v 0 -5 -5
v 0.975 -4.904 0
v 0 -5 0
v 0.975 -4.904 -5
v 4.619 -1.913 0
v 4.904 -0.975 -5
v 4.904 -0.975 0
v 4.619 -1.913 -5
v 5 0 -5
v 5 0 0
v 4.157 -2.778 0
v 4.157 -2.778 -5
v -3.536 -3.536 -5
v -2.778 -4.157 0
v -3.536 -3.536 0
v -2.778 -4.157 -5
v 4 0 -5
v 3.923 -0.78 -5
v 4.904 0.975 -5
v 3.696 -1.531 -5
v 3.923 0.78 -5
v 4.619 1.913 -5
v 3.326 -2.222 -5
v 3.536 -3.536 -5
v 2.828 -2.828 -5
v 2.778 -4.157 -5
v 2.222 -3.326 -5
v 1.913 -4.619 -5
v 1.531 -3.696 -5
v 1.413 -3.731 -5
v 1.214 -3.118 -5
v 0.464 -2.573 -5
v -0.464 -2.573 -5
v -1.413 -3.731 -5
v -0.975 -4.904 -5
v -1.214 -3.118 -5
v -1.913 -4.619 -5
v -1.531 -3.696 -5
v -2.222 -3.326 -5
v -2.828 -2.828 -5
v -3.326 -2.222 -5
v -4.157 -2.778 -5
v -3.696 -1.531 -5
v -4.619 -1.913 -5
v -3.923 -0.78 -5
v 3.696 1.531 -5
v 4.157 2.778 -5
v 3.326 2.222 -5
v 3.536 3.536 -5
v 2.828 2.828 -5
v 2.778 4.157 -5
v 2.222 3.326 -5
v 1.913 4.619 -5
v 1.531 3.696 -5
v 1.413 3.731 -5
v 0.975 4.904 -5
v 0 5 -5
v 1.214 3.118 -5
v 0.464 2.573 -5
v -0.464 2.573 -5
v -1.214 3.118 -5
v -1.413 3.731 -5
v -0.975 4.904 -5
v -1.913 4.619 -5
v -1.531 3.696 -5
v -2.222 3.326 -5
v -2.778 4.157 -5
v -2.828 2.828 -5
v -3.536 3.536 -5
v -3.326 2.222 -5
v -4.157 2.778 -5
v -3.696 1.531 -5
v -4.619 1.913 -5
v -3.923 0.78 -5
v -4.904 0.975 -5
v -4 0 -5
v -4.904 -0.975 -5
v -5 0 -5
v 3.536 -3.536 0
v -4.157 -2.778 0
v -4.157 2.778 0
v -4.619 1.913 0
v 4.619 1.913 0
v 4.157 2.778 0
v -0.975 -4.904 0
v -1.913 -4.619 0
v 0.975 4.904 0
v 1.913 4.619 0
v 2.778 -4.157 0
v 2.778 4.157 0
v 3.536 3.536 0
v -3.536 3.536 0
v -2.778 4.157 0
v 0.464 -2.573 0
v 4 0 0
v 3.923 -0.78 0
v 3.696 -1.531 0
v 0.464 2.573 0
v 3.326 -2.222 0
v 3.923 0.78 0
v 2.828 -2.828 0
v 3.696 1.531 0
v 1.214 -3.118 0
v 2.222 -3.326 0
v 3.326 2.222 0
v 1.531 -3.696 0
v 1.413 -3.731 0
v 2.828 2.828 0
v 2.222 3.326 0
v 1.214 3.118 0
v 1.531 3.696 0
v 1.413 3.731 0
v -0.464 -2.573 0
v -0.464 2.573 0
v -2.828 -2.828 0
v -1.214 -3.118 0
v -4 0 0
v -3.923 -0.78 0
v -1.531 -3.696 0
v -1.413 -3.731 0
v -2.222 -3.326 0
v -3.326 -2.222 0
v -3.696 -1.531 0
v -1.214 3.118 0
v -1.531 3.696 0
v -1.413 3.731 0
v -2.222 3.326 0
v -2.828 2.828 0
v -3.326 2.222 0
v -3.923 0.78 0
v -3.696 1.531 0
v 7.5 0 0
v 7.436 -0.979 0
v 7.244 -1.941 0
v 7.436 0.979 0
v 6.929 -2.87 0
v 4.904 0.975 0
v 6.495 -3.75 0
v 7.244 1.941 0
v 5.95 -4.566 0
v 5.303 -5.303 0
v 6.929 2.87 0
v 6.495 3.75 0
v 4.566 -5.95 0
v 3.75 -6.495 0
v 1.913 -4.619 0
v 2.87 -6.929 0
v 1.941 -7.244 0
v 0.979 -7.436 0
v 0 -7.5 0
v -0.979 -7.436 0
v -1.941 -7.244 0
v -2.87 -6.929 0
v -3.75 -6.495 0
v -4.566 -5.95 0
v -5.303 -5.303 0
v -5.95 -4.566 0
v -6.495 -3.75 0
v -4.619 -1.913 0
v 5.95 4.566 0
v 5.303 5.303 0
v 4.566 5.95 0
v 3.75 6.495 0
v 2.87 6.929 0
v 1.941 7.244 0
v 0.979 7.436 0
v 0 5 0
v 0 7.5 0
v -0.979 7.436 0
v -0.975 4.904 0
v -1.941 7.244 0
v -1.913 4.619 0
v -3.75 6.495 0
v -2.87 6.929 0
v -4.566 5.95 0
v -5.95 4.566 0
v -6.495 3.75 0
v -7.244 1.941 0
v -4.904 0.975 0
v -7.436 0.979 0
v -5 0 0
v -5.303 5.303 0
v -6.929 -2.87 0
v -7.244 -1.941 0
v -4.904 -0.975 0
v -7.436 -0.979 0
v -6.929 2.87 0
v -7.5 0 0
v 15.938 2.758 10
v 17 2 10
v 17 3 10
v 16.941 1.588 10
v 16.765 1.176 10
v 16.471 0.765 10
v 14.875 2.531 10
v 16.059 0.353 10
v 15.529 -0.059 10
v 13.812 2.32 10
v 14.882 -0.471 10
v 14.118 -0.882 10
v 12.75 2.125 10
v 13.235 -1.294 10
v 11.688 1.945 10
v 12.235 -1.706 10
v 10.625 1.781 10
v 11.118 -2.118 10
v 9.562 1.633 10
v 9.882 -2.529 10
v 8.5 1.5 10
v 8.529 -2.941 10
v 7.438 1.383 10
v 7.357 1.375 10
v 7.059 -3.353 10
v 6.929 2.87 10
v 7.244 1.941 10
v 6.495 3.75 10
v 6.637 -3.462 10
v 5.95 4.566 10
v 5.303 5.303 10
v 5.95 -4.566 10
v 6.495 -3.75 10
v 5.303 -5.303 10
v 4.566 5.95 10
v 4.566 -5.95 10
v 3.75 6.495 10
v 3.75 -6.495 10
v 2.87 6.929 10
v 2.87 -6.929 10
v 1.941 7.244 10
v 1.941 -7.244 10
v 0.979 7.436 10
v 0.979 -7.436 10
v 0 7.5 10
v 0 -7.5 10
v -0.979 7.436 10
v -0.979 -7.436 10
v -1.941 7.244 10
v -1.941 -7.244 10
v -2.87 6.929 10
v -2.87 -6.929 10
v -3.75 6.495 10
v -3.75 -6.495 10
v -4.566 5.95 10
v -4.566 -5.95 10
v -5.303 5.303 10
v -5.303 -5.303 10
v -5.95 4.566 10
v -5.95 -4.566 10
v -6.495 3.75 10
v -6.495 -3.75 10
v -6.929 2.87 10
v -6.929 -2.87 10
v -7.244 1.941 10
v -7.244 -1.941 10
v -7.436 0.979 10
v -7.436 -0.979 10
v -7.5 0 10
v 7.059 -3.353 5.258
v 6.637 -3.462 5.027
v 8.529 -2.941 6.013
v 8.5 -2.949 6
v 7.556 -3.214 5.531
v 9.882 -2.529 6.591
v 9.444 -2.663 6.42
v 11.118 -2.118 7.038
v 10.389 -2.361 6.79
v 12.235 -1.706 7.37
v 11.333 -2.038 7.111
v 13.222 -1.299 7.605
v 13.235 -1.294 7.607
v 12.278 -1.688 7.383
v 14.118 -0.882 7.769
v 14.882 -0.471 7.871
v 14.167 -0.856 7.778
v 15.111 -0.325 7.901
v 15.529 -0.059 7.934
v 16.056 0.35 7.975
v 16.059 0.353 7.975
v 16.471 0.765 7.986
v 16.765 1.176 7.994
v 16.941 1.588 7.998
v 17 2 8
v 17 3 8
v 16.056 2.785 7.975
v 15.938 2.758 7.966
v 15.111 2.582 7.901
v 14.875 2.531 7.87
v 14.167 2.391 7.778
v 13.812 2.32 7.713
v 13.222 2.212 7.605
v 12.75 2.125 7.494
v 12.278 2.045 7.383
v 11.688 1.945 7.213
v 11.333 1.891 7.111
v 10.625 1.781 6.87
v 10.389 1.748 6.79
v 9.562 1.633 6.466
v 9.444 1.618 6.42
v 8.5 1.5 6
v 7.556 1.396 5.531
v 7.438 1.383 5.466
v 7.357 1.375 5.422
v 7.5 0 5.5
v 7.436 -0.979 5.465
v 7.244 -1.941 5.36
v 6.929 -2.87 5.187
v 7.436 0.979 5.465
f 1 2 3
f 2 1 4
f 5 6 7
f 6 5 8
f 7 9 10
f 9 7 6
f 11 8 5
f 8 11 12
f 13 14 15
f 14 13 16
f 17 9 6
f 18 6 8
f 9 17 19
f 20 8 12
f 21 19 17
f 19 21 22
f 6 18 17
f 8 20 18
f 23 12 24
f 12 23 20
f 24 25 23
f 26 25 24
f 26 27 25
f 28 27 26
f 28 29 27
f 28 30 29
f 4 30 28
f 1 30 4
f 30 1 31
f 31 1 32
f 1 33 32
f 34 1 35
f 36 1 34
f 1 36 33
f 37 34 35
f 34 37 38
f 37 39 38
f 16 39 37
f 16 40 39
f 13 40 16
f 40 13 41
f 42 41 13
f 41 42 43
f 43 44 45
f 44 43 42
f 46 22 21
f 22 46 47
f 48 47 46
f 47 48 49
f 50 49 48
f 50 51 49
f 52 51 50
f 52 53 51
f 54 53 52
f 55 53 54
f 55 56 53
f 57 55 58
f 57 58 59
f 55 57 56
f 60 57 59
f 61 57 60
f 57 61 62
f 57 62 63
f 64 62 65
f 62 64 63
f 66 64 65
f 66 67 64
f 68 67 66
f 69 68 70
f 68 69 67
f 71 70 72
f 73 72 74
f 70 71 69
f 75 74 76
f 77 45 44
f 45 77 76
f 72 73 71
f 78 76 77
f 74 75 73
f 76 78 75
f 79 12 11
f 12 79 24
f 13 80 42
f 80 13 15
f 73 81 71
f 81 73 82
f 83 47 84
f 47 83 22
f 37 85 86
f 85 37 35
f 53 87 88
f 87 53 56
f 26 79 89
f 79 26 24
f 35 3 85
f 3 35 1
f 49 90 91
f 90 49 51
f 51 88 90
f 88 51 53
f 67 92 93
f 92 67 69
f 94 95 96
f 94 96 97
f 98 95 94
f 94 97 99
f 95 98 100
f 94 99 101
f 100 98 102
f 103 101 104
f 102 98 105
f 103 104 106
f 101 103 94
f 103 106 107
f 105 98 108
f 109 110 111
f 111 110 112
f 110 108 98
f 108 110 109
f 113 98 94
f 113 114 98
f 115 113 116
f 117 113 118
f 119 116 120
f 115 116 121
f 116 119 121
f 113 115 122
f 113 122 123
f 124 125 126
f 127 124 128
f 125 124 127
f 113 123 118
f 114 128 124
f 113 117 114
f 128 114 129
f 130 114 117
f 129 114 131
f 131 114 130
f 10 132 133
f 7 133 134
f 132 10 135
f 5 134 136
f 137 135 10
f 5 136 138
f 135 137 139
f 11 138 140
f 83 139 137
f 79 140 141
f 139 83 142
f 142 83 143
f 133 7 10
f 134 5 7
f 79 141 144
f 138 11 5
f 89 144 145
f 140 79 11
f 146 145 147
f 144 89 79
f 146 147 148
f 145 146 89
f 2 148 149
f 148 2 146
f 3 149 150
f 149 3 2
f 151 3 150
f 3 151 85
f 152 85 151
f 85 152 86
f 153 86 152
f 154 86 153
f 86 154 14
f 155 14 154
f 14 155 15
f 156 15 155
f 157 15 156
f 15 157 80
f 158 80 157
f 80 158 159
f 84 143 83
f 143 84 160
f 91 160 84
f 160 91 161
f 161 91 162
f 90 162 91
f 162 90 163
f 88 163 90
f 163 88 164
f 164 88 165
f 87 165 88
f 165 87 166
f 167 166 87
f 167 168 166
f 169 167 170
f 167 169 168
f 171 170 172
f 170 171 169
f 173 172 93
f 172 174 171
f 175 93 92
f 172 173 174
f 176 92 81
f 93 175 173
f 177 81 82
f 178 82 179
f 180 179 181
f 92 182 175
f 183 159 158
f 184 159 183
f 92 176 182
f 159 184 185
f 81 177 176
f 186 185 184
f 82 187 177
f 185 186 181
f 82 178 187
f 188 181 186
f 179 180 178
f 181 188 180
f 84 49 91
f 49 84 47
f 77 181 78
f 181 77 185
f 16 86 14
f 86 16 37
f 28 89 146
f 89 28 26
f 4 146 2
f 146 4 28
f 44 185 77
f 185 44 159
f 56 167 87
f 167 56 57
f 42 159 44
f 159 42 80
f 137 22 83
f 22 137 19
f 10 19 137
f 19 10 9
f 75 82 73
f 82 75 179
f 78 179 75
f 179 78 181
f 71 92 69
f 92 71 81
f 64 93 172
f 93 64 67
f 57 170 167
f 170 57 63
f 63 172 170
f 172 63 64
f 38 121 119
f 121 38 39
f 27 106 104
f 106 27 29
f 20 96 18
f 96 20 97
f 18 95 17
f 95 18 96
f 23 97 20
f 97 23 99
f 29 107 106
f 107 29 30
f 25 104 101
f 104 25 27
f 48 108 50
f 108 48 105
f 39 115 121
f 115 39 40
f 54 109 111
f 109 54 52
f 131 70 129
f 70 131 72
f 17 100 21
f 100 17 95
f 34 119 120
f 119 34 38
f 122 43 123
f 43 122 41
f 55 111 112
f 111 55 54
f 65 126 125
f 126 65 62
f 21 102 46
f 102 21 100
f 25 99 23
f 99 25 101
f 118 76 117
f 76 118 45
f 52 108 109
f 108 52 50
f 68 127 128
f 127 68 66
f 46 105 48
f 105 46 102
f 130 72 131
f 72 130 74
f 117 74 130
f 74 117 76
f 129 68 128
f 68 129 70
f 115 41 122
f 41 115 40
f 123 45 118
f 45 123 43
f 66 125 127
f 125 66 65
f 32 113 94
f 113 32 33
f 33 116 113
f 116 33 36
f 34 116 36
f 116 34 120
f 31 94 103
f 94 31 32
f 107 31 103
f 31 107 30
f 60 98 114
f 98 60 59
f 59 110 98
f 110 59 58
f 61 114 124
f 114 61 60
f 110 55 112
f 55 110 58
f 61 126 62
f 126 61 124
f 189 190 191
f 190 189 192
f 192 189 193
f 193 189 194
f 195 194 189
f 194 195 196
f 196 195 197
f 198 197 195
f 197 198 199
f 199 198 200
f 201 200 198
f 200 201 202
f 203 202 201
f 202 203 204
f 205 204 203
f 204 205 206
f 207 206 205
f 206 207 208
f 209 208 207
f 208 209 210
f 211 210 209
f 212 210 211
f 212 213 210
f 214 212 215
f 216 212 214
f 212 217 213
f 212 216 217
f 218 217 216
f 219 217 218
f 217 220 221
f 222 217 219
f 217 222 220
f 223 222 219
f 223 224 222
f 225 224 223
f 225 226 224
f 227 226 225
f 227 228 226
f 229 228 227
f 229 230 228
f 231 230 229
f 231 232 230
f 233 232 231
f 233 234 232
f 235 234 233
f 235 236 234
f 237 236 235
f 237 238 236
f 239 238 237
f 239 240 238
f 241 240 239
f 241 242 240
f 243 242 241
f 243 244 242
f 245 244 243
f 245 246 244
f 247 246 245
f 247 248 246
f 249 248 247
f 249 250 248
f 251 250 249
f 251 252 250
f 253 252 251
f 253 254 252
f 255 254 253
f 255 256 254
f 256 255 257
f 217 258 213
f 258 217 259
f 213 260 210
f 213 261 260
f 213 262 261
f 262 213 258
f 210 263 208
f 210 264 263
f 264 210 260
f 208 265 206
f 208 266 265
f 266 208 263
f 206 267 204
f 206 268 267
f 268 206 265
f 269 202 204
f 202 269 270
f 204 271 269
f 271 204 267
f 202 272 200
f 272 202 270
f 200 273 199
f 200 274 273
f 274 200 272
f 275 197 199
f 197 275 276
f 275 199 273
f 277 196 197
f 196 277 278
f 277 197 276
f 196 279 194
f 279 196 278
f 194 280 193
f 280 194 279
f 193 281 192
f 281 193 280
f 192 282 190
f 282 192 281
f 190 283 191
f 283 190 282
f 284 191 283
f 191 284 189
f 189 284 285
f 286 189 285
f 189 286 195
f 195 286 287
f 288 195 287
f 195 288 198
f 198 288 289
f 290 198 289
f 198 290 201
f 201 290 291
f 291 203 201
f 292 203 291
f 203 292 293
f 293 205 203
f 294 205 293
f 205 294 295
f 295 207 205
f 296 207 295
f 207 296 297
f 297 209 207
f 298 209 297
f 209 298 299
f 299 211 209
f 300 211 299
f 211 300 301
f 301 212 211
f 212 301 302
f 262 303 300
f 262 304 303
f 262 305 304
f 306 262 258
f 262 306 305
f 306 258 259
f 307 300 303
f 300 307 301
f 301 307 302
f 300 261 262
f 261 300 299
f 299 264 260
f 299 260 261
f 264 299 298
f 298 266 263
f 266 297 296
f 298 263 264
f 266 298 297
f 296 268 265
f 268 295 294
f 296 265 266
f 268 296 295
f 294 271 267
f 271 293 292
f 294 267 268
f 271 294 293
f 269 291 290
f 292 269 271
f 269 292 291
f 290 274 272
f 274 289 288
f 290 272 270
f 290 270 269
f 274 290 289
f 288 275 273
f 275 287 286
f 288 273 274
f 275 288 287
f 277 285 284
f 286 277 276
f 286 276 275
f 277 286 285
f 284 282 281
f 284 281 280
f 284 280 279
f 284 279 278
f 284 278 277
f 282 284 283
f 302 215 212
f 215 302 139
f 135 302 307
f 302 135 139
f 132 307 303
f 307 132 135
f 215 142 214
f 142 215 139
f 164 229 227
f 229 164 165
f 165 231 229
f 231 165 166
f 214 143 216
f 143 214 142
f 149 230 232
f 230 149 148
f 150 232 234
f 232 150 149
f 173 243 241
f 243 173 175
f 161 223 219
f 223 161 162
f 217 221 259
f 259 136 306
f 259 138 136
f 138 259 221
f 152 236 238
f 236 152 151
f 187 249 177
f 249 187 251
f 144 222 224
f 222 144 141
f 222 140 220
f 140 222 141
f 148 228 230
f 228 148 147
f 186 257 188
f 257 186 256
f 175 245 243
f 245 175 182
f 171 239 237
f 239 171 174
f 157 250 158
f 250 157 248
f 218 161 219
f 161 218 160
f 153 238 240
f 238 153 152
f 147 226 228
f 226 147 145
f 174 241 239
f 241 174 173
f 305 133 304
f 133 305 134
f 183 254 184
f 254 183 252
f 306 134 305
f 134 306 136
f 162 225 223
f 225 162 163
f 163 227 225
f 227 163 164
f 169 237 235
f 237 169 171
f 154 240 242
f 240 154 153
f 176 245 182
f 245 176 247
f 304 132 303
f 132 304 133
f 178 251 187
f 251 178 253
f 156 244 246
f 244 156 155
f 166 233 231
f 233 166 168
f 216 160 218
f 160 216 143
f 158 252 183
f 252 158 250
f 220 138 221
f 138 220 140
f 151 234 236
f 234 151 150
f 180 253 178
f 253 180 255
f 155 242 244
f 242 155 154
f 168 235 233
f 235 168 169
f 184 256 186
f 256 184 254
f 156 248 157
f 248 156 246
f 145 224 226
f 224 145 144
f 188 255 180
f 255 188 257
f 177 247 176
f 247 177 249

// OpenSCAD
// file: ../../connectors/notched_circle/constants.scad
connectors_notched_circle_thickness = 2;
connectors_notched_circle_notch_diameter = 3;
connectors_notched_circle_loose_length = 1;
connectors_notched_circle_loose_to_tight_length = 1;
// file: ../../utilities/math.scad
function linear_interpolate(
  from,
  to,
  mix
) = from + (to - from) * mix;

function remap(
  value,
  fromLow,
  fromHigh,
  toLow,
  toHigh
) = linear_interpolate(toLow, toHigh, (value - fromLow) / (fromHigh - fromLow));
// file: ../../connectors/notched_circle/male.scad
include <../../settings.scad>;
use <../../utilities/cylinders.scad>;
include <constants.scad>;

// Renders the male counterpart of a circular connector with an orienting notch.
// Place on the surface oriented so that Z+ is the surface normal.
module connectors_notched_circle_male(
    // The outer diameter of the male circle.
    diameter,
    // The length of the male circle.
    length,
    // The number of notches, spaced evenly.
    notches
) {
  union() {
    difference() {
      cylinder(
        d = diameter,
        h = length,
        $fn = cylinder_sides(diameter)
      );
      cylinder(
        d = diameter - connectors_notched_circle_thickness,
        h = length + 0.001,
        $fn = cylinder_sides(diameter)
      );
    };
    intersection() {
      for (notch = [0:notches - 1]) {
        rotate([0, 0, notch * 360 / notches]) {
          translate([
            0,
            diameter / 2 - connectors_notched_circle_thickness / 2,
            0
          ]) {
            cylinder(
              d = connectors_notched_circle_notch_diameter,
              h = length,
              $fn = cylinder_sides(connectors_notched_circle_notch_diameter)
            );
          };
        };
      };
      cylinder(
        d = diameter,
        h = length,
        $fn = cylinder_sides(diameter)
      );
    };
  };
};
// file: measurements.scad
hero_dualie_safety_connector_diameter = 10;
hero_dualie_safety_connector_length = 5;
hero_dualie_safety_connector_notches = 2;

hero_dualie_safety_shaft_diameter = 15;
hero_dualie_safety_shaft_length = 10;

hero_dualie_safety_horn_length = 17;
hero_dualie_safety_horn_base_a = 1;
hero_dualie_safety_horn_base_b = -5;
hero_dualie_safety_horn_tip_a = 3;
hero_dualie_safety_horn_tip_b = 2;
hero_dualie_safety_horn_thickness = 2;
// file: ../../utilities/curves.scad
use <math.scad>;

// Approximates a curve by interpolating between two coordinates with a
// different rate of acceleration on each axis.
function utilities_curves_exponential(
  // The coordinate to interpolate from.
  from,
  // The coordinate to interpolate to.
  to,
  // The exponent on each axis, where:
  // - 0...1 starts fast then decelerates.
  // - 1 is linear.
  // - 1...infinity starts slow then accelerates.
  exponents
) = [
  for (progress = [0:utilities_curves_approximate_segments(from, to)]) [
    for (axis = [0:len(from) - 1])
      linear_interpolate(
        from[axis],
        to[axis],
        pow(
          progress / utilities_curves_approximate_segments(from, to),
          exponents[axis]
        )
      )
  ]
];

// Attempts to guess how many segments should be present on a curve.
function utilities_curves_approximate_segments(
  // The start of the curve.
  from,
  // The end of the curve.
  to
) = max(1, round(norm(to - from) / $fs) - 1);
// file: ../../utilities/cylinders.scad
// Calculates the $fn which should be used for a cylinder of a specific size.
function cylinder_sides(
  // The diameter of the cylinder.
  diameter
) = ceil(
  max(
    min(
      360 / $fa,
      diameter * PI / $fs
    ),
    8
  )
);

// Generates a grid of square perforations through a cylinder of a specific
// size.
module cylinder_perforations(
  // The diameter of the cylinder.
  diameter,
  // The height of the cylinder.
  length,
  // The size (width/height) of each perforation.
  perforation_size,
  // The target spacing between perforations.  This will be adjusted to fit
  // evenly on the cylinder.
  perforation_spacing
) {
  half_perimeter = diameter * PI / 2;
  angularPerforations = round(half_perimeter / perforation_spacing);
  zPerforations = round(length / perforation_spacing);
  for (angle = [0:180 / angularPerforations:180]) {
    rotate([0, 0, angle]) {
      for (z = [(length / zPerforations) * 0.5:length / zPerforations:length - (length / zPerforations) * 0.5]) {
        translate([0, 0, z]) {
          cube([diameter, perforation_size, perforation_size], center = true);
        };
      }
    };
  };
};

// Generates a "pipe" which lofts a sequence of circles together.
module cylinder_sequence(
  // The diameter of the first circle.
  initial_diameter,
  // An array of arrays, where each child array is two numbers:
  // - The length of the segment along Z.
  // - The diameter of the end of the segment.
  length_diameter_pairs,
  // The number of sides of all circles drawn.
  sides,
  // Used for recursion; leave as default.
  i = 0
) {
  if (i < len(length_diameter_pairs)) {
    cylinder(
      d1 = initial_diameter,
      d2 = length_diameter_pairs[i][1],
      h = length_diameter_pairs[i][0],
      $fn = sides
    );
    translate([
      0,
      0,
      length_diameter_pairs[i][0]
    ]) {
      cylinder_sequence(
        length_diameter_pairs[i][1],
        length_diameter_pairs,
        sides,
        i + 1
      );
    };
  };
};
// file: shape.scad
include <../../settings.scad>;
use <../../utilities/cylinders.scad>;
use <../../utilities/curves.scad>;
include <measurements.scad>;
use <../../connectors/notched_circle/male.scad>;

module hero_dualie_safety_shape() {
  // The connector to the body.
  rotate([180, 0, 0]) {
    connectors_notched_circle_male(
      hero_dualie_safety_connector_diameter,
      hero_dualie_safety_connector_length,
      hero_dualie_safety_connector_notches
    );
  };

  // The shaft.
  cylinder(
    d = hero_dualie_safety_shaft_diameter,
    h = hero_dualie_safety_shaft_length,
    $fn = cylinder_sides(hero_dualie_safety_shaft_diameter)
  );

  // The horn works by intersecting a top and side profile.
  intersection() {
    // The top profile.
    linear_extrude(hero_dualie_safety_shaft_length) {
      top = utilities_curves_exponential(
        [0, hero_dualie_safety_horn_base_a],
        [hero_dualie_safety_horn_length, hero_dualie_safety_horn_tip_a],
        [1, 2]
      );

      bottom = utilities_curves_exponential(
        [hero_dualie_safety_horn_length, hero_dualie_safety_horn_tip_b],
        [0, hero_dualie_safety_horn_base_b],
        [2, 1]
      );

      points = concat(top, bottom);

      polygon(points);
    };

    min_y = min(
      hero_dualie_safety_horn_base_a,
      hero_dualie_safety_horn_base_b,
      hero_dualie_safety_horn_tip_a,
      hero_dualie_safety_horn_tip_b
    );
    max_y = max(
      hero_dualie_safety_horn_base_a,
      hero_dualie_safety_horn_base_b,
      hero_dualie_safety_horn_tip_a,
      hero_dualie_safety_horn_tip_b
    );
    translate([0, max_y, 0]) {
      rotate([90, 0, 0]) {
        linear_extrude(max_y - min_y) {
          // The side profile.
          top = [
            [0, hero_dualie_safety_shaft_length],
            [hero_dualie_safety_horn_length, hero_dualie_safety_shaft_length]
          ];

          bottom = utilities_curves_exponential(
            [
              hero_dualie_safety_horn_length,
              hero_dualie_safety_shaft_length - hero_dualie_safety_horn_thickness
            ],
            [0, 0],
            [1, 2]
          );

          points = concat(top, bottom);

          polygon(points);
        };
      };
    };
  };
};
// file: ../../settings.scad
// When true, lower resolution primitives will be used.
draft = false;

$fs = draft ? 2 : 1;
$fa = draft ? 12 : 6;

// The amount of space left between parts which must fit together tightly.
tight_tolerance = 0.6;

// The amount of space left between parts which must fit together loosely.
loose_tolerance = 1;
// main file
include <../../settings.scad>;
use <shape.scad>;

hero_dualie_safety_shape();
